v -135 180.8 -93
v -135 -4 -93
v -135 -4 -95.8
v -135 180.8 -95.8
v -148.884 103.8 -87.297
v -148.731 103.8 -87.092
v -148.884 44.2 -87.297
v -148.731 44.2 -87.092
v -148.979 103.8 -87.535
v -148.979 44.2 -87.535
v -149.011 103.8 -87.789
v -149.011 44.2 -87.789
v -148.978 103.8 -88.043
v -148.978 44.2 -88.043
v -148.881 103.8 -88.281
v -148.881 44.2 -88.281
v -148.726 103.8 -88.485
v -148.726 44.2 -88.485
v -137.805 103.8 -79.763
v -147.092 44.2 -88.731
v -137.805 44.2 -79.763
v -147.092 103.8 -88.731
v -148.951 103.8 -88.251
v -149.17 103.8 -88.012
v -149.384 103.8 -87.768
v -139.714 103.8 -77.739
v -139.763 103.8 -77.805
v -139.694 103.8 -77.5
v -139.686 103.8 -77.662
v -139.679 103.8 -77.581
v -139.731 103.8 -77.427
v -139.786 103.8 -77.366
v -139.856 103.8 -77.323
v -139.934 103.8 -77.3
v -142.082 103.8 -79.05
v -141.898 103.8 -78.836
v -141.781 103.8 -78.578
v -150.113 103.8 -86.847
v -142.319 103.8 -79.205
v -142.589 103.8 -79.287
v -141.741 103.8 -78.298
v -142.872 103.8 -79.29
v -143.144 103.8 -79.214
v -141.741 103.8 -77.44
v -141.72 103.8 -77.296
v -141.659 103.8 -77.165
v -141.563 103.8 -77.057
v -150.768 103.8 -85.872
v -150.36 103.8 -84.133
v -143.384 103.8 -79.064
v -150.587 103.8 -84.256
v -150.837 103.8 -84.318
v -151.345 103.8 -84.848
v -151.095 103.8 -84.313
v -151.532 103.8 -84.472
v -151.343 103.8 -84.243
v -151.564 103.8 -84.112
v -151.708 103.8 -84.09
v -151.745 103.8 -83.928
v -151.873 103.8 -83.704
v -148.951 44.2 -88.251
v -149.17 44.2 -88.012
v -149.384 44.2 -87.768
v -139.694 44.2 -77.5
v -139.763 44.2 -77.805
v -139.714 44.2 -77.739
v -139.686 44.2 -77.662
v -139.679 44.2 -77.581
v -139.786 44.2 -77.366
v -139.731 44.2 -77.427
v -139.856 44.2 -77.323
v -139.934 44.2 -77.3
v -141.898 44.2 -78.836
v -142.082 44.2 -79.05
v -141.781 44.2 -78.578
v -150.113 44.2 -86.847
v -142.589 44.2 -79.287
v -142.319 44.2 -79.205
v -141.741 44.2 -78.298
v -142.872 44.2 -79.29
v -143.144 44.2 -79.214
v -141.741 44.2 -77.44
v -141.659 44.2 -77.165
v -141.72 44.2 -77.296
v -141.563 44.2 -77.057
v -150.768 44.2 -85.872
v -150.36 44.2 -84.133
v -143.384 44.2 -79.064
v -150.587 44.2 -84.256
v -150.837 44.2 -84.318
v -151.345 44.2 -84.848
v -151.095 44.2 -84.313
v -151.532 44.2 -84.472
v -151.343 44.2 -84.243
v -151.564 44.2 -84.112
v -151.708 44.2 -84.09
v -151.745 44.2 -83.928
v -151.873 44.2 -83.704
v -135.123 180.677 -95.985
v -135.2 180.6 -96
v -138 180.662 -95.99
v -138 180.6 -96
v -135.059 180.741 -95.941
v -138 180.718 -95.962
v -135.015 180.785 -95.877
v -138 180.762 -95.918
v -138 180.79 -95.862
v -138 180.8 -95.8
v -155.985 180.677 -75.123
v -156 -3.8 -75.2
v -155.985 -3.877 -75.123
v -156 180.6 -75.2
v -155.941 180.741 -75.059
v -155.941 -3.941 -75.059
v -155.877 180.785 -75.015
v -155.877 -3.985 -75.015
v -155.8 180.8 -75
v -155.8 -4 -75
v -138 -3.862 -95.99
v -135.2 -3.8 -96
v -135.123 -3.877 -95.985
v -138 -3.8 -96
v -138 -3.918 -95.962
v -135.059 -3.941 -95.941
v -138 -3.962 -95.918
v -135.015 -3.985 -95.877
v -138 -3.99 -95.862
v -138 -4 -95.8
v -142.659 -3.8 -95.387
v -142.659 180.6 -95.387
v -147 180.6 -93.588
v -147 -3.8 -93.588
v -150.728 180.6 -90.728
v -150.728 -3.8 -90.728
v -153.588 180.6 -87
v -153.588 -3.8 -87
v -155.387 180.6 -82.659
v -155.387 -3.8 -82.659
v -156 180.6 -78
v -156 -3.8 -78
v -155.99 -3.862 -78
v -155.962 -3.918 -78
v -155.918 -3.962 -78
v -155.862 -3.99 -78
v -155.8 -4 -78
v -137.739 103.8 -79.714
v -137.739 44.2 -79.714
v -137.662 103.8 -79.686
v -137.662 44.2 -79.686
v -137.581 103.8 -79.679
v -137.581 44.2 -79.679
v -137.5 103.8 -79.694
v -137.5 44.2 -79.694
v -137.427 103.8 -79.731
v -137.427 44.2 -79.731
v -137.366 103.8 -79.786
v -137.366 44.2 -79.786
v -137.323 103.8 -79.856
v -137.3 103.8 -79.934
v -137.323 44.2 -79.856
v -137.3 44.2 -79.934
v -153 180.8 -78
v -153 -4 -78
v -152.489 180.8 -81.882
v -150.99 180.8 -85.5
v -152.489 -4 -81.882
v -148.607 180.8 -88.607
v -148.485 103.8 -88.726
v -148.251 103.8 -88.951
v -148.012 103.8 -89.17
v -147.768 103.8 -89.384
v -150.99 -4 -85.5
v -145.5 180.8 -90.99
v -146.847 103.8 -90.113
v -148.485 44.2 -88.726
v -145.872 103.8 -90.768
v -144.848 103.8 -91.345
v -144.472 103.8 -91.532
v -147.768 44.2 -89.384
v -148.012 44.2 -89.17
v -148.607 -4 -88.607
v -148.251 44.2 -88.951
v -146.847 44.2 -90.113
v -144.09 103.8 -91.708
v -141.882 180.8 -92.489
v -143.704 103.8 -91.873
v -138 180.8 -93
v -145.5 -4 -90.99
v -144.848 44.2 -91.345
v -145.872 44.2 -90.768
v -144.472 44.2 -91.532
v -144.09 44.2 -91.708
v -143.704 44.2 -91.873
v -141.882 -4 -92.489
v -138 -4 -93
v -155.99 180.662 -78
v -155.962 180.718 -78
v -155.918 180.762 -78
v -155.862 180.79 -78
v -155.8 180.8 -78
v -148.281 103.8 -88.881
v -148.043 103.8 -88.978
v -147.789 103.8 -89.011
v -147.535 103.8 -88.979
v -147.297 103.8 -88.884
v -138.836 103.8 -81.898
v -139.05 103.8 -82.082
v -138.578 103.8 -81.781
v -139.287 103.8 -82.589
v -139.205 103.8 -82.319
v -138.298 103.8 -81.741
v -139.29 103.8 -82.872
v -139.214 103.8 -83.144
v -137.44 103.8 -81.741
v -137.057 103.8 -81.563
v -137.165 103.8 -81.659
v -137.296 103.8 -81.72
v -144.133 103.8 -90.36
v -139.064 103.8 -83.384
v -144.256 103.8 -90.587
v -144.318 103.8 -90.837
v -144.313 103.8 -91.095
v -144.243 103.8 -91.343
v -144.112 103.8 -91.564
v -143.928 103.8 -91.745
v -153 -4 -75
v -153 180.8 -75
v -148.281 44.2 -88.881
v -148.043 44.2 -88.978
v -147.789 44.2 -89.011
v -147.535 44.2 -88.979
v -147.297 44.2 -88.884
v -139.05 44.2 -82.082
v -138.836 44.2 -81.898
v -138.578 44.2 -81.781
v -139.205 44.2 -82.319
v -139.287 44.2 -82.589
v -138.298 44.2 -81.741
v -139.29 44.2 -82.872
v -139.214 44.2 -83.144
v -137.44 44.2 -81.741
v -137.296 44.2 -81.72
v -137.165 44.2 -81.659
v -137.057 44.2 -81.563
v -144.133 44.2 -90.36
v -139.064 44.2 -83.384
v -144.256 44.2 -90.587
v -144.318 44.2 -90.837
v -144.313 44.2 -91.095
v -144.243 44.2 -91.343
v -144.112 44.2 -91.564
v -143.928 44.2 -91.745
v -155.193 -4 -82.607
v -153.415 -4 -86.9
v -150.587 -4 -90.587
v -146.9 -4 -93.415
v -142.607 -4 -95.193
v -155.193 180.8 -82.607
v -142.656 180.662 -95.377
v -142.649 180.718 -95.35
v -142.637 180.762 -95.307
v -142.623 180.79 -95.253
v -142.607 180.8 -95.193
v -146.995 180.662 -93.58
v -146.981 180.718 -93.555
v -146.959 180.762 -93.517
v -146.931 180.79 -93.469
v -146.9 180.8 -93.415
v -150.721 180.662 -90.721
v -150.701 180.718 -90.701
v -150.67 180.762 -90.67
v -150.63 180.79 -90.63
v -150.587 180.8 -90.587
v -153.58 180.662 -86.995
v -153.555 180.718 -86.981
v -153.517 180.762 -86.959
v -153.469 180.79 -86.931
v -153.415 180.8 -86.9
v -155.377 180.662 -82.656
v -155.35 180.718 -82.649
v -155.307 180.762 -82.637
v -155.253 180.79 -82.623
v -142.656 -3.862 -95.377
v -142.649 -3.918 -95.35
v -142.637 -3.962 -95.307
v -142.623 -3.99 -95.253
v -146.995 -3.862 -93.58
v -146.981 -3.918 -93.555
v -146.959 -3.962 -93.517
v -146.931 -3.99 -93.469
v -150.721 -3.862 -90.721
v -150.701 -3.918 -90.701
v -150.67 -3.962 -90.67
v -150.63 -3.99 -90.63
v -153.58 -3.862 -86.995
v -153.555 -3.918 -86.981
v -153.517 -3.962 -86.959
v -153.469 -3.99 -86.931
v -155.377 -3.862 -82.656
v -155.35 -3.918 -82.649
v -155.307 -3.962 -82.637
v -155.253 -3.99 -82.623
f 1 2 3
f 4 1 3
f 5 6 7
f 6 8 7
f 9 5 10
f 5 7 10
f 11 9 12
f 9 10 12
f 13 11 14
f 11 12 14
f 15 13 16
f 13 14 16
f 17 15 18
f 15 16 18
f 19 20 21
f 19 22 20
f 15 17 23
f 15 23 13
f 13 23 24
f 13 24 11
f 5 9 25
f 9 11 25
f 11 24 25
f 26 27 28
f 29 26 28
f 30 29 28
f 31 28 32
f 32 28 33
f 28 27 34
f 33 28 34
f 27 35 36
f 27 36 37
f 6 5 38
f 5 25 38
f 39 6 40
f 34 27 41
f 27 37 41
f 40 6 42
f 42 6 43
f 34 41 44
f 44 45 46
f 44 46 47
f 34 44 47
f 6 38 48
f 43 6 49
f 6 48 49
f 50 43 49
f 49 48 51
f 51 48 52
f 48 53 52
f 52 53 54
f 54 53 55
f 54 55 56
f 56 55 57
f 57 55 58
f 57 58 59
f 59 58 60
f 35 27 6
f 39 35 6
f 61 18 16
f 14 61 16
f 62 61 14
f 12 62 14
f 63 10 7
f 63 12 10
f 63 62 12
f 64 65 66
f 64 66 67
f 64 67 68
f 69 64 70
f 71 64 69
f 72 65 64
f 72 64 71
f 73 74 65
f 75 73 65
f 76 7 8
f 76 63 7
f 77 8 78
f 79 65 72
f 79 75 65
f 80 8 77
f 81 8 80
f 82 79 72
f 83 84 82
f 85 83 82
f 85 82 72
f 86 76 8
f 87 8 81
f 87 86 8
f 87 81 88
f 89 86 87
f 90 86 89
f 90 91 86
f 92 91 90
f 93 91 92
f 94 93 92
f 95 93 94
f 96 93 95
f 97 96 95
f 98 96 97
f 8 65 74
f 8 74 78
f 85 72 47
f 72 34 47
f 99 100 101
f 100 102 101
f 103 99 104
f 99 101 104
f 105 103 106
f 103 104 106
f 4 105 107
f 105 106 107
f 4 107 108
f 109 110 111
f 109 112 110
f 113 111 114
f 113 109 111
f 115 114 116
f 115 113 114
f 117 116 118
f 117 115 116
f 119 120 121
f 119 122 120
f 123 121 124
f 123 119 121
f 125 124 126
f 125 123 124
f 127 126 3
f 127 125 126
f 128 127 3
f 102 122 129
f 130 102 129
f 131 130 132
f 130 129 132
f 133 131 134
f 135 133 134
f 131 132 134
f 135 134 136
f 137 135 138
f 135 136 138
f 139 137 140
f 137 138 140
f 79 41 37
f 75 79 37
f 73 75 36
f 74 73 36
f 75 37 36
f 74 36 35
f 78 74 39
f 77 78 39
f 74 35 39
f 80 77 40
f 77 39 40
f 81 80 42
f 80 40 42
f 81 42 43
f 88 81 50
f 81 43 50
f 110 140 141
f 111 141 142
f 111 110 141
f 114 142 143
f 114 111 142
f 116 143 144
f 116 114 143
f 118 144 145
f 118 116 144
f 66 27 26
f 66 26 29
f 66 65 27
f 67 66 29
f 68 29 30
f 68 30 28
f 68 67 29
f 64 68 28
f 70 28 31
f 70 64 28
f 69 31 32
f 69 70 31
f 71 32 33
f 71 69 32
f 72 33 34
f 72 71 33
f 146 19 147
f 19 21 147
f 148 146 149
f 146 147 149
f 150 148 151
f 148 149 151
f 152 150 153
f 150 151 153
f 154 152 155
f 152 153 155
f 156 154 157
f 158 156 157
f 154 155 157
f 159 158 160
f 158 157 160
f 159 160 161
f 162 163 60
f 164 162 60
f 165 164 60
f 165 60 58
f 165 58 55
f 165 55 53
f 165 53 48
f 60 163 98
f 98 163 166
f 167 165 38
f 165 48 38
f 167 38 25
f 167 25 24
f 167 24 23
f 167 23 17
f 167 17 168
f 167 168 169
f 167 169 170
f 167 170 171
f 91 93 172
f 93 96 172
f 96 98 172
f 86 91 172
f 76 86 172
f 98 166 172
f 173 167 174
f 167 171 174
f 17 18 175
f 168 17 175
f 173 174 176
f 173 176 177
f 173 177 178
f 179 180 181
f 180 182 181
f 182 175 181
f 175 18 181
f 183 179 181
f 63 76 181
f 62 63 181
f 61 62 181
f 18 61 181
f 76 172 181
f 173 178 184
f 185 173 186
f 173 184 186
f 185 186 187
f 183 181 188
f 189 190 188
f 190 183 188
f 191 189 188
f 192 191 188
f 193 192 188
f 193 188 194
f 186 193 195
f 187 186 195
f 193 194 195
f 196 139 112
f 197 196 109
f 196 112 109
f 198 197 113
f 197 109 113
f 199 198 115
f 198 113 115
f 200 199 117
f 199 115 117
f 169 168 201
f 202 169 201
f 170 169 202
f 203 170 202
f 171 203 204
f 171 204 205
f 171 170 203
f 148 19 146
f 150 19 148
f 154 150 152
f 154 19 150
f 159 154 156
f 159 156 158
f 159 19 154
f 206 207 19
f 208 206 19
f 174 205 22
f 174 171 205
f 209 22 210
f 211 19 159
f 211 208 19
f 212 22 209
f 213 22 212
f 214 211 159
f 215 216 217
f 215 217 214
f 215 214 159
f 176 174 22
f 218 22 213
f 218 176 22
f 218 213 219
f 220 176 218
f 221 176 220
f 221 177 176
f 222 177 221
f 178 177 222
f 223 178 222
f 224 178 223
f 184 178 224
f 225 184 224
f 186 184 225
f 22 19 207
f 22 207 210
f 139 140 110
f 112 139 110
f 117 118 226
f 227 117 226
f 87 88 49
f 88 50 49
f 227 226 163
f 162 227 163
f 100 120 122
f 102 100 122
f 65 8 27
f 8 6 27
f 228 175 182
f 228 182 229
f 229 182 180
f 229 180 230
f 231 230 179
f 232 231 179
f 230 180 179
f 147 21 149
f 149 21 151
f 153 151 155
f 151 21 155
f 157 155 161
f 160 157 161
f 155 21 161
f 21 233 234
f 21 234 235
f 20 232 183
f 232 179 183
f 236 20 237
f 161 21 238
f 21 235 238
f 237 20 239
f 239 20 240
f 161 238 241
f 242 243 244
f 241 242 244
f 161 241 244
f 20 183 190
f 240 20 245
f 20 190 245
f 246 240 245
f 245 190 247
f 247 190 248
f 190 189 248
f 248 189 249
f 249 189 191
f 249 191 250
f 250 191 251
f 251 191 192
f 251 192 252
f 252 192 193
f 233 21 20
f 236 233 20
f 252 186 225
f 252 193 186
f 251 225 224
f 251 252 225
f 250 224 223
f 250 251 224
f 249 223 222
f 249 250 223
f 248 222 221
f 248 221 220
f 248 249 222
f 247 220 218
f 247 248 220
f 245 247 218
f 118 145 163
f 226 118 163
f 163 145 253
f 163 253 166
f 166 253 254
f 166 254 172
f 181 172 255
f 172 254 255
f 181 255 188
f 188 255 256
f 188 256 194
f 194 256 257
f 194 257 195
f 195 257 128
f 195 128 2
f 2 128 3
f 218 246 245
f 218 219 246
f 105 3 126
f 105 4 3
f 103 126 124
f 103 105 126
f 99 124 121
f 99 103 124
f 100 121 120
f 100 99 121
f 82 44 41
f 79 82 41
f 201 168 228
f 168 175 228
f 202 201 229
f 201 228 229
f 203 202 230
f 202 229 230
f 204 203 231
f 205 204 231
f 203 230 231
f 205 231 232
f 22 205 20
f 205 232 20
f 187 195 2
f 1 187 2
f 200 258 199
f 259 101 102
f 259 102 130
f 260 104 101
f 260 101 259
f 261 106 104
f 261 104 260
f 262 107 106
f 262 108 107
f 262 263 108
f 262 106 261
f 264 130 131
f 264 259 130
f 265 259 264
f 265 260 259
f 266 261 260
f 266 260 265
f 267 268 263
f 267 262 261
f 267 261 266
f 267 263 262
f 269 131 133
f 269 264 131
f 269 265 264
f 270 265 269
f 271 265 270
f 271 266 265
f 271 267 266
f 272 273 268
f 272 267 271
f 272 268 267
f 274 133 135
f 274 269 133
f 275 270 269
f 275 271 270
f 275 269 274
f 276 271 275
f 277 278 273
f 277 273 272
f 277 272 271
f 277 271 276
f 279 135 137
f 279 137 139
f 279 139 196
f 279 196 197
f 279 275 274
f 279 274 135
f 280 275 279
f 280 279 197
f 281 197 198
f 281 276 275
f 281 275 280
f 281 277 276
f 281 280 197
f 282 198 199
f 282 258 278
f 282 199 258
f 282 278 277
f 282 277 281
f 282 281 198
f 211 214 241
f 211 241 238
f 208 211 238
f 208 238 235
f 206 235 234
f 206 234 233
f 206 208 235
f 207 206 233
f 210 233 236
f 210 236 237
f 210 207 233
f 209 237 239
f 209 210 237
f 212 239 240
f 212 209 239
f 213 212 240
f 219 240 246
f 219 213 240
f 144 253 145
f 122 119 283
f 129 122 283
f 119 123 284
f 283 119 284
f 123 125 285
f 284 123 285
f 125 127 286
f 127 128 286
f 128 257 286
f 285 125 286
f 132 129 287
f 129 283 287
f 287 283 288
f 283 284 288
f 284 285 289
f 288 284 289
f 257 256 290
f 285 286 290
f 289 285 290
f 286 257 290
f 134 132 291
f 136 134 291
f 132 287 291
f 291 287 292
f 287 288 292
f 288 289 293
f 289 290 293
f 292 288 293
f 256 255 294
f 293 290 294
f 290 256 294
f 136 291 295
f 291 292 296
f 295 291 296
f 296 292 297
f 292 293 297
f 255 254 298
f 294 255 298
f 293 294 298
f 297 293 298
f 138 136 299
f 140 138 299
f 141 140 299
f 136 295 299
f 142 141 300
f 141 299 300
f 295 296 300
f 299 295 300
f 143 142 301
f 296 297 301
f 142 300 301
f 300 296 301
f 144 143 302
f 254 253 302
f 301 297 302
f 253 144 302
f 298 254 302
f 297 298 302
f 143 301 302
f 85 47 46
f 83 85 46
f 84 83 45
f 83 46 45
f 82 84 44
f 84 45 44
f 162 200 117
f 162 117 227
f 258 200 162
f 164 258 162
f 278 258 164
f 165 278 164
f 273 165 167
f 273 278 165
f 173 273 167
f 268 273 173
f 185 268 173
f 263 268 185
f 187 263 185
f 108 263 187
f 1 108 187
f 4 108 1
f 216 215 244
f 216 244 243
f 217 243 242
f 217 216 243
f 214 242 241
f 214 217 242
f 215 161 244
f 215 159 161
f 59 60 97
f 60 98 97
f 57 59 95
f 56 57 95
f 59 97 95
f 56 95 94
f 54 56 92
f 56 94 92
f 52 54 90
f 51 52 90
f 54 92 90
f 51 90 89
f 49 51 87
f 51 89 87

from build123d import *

# Parameters (mm, degrees)
STOCK_OUTTER_CASE_1_START = -4
STOCK_OUTTER_CASE_1_DEPTH = 184.8
FILLET1_R                 = 0.2
BOSS_EXTRUDE4_DEPTH       = 29.8
FILLET3_R                 = 0.3
FILLET4_R                 = 1


# Read off the part's stored shape, not the designer's step: Stock-outter_case-1
with BuildPart() as part:
    # Stock-outter_case-1 outline → Stock-outter_case-1 (new body)
    with BuildSketch(Plane(origin=(0, 0, 0), x_dir=(1, 0, 0), z_dir=(0, 1, 0)).offset(STOCK_OUTTER_CASE_1_START)):
        with BuildLine():
            Line((-138, 93), (-135, 93))
            Line((-135, 93), (-135, 96))
            Line((-135, 96), (-138, 96))
            ThreePointArc((-138, 96), (-150.727922061, 90.727922061), (-156, 78))
            Line((-156, 78), (-156, 75))
            Line((-156, 75), (-153, 75))
            Line((-153, 75), (-153, 78))
            ThreePointArc((-153, 78), (-148.606601718, 88.606601718), (-138, 93))
        make_face()
    extrude(amount=STOCK_OUTTER_CASE_1_DEPTH)

    # Fillet1
    fillet1_edges = [part.edges().sort_by_distance(p)[0] for p in [
        (-150.727922061, 180.8, -90.727922061),
        (-156, 180.8, -76.5),
        (-136.5, 180.8, -96),
        (-150.727922061, -4, -90.727922061),
        (-156, -4, -76.5),
        (-136.5, -4, -96),
        (-156, 88.4, -75),
        (-135, 88.4, -96),
    ]]
    fillet(fillet1_edges, radius=FILLET1_R)

    # Sketch5 → Boss-Extrude4 (add, symmetric)
    with BuildSketch(Plane(origin=(0, 74, 0), x_dir=(1, 0, 0), z_dir=(0, 1, 0))):
        with BuildLine():
            Line((-137.385981926, 79.358072098), (-137.056795696, 81.56280876))
            ThreePointArc((-137.056795696, 81.56280876), (-137.228508787, 81.694568849), (-137.439817918, 81.741414955))
            Line((-137.439817918, 81.741414955), (-138.298334245, 81.741414955))
            ThreePointArc((-138.298334245, 81.741414955), (-139.204642032, 82.318796694), (-139.064378688, 83.384202565))
            Line((-139.064378688, 83.384202565), (-144.848487028, 91.34534471))
            ThreePointArc((-144.848487028, 91.34534471), (-146.365861195, 90.450396237), (-147.767847562, 89.383723205))
            Line((-147.767847562, 89.383723205), (-137.385981926, 79.358072098))
        make_face()
    boss_extrude4 = extrude(amount=BOSS_EXTRUDE4_DEPTH, both=True)

    # Mirror2: Boss-Extrude4 across plane
    add(boss_extrude4.mirror(Plane(origin=(-30, 0, 30), x_dir=(0.7071067811865478, 0, 0.7071067811865472), z_dir=(0.7071067811865475, 0, -0.7071067811865477))))

    # Fillet3
    fillet3_edges = [part.edges().sort_by_distance(p)[0] for p in [
        (-137.385981926, 74, -79.358072098),
        (-139.358072098, 74, -77.385981926),
    ]]
    fillet(fillet3_edges, radius=FILLET3_R)

    # Fillet4
    fillet4_edges = [part.edges().sort_by_distance(p)[0] for p in [
        (-147.767847562, 74, -89.383723205),
        (-144.848487028, 74, -91.34534471),
        (-151.34534471, 74, -84.848487028),
        (-149.383723205, 74, -87.767847562),
    ]]
    fillet(fillet4_edges, radius=FILLET4_R)


solid = part.part
